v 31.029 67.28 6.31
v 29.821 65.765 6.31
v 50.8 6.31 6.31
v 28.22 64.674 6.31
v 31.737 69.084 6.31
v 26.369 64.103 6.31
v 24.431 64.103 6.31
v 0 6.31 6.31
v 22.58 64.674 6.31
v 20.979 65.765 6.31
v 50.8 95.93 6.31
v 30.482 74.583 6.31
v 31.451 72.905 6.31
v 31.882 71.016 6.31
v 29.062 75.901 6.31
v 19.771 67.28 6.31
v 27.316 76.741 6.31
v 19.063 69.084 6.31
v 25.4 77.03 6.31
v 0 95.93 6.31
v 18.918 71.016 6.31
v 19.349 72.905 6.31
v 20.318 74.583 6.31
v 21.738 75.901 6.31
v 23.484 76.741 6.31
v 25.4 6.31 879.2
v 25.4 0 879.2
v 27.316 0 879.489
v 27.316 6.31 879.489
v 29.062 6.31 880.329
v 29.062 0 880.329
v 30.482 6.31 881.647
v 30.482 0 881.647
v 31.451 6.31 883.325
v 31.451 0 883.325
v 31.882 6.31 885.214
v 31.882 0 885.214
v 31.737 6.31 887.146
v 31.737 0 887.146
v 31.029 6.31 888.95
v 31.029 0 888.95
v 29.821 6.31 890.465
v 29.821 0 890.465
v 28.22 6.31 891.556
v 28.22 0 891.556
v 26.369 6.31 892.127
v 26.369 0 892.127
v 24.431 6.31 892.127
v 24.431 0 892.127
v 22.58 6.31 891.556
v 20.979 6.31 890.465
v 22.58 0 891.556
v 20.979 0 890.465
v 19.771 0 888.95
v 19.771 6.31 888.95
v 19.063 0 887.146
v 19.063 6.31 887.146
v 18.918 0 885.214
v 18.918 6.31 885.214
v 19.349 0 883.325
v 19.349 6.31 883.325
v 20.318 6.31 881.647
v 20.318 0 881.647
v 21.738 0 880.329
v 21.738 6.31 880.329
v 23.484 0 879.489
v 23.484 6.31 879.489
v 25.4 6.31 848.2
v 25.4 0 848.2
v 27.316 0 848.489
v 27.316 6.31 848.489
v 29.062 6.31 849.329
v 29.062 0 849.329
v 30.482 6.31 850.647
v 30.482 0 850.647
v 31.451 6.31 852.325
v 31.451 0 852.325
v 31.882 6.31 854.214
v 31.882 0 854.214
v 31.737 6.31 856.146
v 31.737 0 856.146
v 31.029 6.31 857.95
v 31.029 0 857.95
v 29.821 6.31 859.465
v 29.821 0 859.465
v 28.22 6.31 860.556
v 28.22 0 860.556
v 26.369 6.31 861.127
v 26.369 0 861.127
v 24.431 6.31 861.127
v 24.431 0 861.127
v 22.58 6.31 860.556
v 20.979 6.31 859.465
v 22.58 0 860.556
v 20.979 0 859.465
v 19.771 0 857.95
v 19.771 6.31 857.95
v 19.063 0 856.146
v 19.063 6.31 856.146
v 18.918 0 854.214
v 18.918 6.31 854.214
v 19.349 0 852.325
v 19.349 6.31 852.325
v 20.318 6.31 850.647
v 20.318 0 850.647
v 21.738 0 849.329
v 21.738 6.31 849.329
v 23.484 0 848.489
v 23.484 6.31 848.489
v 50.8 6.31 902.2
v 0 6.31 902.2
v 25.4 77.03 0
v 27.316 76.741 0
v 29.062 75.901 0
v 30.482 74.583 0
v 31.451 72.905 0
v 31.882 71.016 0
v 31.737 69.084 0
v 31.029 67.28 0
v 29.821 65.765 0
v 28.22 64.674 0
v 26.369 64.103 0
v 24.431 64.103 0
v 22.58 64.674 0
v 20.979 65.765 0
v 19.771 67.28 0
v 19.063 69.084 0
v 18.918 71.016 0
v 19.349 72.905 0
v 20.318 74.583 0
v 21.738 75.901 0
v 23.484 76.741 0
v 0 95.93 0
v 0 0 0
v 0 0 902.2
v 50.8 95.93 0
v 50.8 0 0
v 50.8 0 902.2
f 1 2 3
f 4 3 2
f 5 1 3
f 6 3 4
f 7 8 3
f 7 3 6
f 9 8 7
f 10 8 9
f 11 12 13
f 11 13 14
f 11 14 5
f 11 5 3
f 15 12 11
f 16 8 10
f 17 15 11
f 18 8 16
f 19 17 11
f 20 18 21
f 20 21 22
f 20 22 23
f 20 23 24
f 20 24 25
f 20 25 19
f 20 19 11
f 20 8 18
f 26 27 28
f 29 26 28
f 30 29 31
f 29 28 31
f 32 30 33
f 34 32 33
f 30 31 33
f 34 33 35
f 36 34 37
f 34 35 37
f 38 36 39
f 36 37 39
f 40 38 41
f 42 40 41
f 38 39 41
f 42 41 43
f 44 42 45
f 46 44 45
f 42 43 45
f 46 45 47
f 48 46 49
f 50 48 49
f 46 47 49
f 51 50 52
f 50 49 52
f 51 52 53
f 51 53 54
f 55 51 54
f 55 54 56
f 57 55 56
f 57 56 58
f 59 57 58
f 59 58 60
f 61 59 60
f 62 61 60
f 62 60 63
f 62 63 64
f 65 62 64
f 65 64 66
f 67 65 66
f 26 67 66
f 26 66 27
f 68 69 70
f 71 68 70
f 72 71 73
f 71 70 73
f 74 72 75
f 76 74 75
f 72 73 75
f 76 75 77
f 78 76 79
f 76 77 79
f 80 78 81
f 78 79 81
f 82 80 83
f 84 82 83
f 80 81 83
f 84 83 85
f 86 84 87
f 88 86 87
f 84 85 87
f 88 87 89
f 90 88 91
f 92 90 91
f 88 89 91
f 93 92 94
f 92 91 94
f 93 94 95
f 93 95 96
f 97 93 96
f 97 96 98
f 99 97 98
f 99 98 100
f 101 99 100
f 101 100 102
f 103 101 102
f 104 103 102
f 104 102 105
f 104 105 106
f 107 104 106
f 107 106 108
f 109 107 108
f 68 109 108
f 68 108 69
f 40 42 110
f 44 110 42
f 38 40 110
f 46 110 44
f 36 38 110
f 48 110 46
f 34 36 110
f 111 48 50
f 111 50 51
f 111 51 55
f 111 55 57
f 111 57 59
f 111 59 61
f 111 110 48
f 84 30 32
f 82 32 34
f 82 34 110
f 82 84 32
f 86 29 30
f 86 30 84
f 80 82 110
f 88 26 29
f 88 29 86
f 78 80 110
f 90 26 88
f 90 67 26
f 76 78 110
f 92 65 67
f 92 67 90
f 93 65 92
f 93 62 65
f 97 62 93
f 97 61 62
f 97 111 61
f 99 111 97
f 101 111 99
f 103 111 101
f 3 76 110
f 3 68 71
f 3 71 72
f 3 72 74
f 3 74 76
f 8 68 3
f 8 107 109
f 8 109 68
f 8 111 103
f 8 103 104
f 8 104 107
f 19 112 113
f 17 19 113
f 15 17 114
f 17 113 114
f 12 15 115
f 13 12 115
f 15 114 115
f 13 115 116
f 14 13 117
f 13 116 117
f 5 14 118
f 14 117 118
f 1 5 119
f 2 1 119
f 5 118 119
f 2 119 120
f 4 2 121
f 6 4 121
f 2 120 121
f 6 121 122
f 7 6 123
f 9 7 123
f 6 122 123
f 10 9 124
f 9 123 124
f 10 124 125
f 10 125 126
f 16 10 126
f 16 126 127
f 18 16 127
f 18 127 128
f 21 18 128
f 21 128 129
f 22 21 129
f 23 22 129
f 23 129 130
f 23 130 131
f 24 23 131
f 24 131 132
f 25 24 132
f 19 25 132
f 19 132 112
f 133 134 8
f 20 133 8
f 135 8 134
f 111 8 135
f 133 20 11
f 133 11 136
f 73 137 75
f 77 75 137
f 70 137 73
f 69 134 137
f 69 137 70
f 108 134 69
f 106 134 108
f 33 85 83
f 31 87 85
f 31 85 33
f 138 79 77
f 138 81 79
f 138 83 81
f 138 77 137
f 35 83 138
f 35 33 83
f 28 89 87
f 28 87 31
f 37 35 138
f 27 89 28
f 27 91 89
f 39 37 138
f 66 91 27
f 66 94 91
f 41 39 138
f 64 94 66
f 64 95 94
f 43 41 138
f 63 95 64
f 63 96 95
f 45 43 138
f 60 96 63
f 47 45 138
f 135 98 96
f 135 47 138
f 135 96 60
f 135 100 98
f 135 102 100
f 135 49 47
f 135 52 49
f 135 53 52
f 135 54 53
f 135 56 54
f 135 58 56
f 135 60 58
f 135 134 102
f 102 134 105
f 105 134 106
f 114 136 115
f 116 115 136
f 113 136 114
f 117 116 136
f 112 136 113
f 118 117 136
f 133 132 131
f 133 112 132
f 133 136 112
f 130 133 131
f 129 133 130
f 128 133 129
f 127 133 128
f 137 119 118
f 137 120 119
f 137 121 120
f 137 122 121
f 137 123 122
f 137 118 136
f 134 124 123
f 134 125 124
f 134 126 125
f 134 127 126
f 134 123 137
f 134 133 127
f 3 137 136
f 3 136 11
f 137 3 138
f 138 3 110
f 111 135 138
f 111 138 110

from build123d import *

# Parameters (mm, degrees)
SALIENTE_EXTRUIR1_DEPTH = 50.8
CROQUIS2_R              = 6.5
CORTAR_EXTRUIR1_DEPTH   = 10
CROQUIS3_R              = 6.5
CORTAR_EXTRUIR2_DEPTH   = 10


with BuildPart() as part:
    # Croquis1 → Saliente-Extruir1 (new body)
    with BuildSketch(Plane(origin=(0, 0, 0), x_dir=(0, 0, -1), z_dir=(1, 0, 0))):
        Polygon((-6.31, 95.93), (0, 95.93), (0, 0), (-902.2, 0), (-902.2, 6.31), (-6.31, 6.31), align=None)
    extrude(amount=SALIENTE_EXTRUIR1_DEPTH)

    # Croquis2 → Cortar-Extruir1 (cut)
    with BuildSketch(Plane(origin=(0, 0, 0), x_dir=(-1, 0, 0), z_dir=(0, -1, 0))):
        with Locations(Location((-25.4, -885.7, 0), (0, 0, 90))):
            Circle(CROQUIS2_R)
        with Locations(Location((-25.4, -854.7, 0), (0, 0, 90))):
            Circle(CROQUIS2_R)
    extrude(amount=-CORTAR_EXTRUIR1_DEPTH, mode=Mode.SUBTRACT)

    # Croquis3 → Cortar-Extruir2 (cut)
    with BuildSketch(Plane(origin=(0, 0, 0), x_dir=(-1, 0, 0), z_dir=(0, 0, -1))):
        with Locations(Location((-25.4, 70.53, 0), (0, 0, 90))):
            Circle(CROQUIS3_R)
    extrude(amount=-CORTAR_EXTRUIR2_DEPTH, mode=Mode.SUBTRACT)


solid = part.part
